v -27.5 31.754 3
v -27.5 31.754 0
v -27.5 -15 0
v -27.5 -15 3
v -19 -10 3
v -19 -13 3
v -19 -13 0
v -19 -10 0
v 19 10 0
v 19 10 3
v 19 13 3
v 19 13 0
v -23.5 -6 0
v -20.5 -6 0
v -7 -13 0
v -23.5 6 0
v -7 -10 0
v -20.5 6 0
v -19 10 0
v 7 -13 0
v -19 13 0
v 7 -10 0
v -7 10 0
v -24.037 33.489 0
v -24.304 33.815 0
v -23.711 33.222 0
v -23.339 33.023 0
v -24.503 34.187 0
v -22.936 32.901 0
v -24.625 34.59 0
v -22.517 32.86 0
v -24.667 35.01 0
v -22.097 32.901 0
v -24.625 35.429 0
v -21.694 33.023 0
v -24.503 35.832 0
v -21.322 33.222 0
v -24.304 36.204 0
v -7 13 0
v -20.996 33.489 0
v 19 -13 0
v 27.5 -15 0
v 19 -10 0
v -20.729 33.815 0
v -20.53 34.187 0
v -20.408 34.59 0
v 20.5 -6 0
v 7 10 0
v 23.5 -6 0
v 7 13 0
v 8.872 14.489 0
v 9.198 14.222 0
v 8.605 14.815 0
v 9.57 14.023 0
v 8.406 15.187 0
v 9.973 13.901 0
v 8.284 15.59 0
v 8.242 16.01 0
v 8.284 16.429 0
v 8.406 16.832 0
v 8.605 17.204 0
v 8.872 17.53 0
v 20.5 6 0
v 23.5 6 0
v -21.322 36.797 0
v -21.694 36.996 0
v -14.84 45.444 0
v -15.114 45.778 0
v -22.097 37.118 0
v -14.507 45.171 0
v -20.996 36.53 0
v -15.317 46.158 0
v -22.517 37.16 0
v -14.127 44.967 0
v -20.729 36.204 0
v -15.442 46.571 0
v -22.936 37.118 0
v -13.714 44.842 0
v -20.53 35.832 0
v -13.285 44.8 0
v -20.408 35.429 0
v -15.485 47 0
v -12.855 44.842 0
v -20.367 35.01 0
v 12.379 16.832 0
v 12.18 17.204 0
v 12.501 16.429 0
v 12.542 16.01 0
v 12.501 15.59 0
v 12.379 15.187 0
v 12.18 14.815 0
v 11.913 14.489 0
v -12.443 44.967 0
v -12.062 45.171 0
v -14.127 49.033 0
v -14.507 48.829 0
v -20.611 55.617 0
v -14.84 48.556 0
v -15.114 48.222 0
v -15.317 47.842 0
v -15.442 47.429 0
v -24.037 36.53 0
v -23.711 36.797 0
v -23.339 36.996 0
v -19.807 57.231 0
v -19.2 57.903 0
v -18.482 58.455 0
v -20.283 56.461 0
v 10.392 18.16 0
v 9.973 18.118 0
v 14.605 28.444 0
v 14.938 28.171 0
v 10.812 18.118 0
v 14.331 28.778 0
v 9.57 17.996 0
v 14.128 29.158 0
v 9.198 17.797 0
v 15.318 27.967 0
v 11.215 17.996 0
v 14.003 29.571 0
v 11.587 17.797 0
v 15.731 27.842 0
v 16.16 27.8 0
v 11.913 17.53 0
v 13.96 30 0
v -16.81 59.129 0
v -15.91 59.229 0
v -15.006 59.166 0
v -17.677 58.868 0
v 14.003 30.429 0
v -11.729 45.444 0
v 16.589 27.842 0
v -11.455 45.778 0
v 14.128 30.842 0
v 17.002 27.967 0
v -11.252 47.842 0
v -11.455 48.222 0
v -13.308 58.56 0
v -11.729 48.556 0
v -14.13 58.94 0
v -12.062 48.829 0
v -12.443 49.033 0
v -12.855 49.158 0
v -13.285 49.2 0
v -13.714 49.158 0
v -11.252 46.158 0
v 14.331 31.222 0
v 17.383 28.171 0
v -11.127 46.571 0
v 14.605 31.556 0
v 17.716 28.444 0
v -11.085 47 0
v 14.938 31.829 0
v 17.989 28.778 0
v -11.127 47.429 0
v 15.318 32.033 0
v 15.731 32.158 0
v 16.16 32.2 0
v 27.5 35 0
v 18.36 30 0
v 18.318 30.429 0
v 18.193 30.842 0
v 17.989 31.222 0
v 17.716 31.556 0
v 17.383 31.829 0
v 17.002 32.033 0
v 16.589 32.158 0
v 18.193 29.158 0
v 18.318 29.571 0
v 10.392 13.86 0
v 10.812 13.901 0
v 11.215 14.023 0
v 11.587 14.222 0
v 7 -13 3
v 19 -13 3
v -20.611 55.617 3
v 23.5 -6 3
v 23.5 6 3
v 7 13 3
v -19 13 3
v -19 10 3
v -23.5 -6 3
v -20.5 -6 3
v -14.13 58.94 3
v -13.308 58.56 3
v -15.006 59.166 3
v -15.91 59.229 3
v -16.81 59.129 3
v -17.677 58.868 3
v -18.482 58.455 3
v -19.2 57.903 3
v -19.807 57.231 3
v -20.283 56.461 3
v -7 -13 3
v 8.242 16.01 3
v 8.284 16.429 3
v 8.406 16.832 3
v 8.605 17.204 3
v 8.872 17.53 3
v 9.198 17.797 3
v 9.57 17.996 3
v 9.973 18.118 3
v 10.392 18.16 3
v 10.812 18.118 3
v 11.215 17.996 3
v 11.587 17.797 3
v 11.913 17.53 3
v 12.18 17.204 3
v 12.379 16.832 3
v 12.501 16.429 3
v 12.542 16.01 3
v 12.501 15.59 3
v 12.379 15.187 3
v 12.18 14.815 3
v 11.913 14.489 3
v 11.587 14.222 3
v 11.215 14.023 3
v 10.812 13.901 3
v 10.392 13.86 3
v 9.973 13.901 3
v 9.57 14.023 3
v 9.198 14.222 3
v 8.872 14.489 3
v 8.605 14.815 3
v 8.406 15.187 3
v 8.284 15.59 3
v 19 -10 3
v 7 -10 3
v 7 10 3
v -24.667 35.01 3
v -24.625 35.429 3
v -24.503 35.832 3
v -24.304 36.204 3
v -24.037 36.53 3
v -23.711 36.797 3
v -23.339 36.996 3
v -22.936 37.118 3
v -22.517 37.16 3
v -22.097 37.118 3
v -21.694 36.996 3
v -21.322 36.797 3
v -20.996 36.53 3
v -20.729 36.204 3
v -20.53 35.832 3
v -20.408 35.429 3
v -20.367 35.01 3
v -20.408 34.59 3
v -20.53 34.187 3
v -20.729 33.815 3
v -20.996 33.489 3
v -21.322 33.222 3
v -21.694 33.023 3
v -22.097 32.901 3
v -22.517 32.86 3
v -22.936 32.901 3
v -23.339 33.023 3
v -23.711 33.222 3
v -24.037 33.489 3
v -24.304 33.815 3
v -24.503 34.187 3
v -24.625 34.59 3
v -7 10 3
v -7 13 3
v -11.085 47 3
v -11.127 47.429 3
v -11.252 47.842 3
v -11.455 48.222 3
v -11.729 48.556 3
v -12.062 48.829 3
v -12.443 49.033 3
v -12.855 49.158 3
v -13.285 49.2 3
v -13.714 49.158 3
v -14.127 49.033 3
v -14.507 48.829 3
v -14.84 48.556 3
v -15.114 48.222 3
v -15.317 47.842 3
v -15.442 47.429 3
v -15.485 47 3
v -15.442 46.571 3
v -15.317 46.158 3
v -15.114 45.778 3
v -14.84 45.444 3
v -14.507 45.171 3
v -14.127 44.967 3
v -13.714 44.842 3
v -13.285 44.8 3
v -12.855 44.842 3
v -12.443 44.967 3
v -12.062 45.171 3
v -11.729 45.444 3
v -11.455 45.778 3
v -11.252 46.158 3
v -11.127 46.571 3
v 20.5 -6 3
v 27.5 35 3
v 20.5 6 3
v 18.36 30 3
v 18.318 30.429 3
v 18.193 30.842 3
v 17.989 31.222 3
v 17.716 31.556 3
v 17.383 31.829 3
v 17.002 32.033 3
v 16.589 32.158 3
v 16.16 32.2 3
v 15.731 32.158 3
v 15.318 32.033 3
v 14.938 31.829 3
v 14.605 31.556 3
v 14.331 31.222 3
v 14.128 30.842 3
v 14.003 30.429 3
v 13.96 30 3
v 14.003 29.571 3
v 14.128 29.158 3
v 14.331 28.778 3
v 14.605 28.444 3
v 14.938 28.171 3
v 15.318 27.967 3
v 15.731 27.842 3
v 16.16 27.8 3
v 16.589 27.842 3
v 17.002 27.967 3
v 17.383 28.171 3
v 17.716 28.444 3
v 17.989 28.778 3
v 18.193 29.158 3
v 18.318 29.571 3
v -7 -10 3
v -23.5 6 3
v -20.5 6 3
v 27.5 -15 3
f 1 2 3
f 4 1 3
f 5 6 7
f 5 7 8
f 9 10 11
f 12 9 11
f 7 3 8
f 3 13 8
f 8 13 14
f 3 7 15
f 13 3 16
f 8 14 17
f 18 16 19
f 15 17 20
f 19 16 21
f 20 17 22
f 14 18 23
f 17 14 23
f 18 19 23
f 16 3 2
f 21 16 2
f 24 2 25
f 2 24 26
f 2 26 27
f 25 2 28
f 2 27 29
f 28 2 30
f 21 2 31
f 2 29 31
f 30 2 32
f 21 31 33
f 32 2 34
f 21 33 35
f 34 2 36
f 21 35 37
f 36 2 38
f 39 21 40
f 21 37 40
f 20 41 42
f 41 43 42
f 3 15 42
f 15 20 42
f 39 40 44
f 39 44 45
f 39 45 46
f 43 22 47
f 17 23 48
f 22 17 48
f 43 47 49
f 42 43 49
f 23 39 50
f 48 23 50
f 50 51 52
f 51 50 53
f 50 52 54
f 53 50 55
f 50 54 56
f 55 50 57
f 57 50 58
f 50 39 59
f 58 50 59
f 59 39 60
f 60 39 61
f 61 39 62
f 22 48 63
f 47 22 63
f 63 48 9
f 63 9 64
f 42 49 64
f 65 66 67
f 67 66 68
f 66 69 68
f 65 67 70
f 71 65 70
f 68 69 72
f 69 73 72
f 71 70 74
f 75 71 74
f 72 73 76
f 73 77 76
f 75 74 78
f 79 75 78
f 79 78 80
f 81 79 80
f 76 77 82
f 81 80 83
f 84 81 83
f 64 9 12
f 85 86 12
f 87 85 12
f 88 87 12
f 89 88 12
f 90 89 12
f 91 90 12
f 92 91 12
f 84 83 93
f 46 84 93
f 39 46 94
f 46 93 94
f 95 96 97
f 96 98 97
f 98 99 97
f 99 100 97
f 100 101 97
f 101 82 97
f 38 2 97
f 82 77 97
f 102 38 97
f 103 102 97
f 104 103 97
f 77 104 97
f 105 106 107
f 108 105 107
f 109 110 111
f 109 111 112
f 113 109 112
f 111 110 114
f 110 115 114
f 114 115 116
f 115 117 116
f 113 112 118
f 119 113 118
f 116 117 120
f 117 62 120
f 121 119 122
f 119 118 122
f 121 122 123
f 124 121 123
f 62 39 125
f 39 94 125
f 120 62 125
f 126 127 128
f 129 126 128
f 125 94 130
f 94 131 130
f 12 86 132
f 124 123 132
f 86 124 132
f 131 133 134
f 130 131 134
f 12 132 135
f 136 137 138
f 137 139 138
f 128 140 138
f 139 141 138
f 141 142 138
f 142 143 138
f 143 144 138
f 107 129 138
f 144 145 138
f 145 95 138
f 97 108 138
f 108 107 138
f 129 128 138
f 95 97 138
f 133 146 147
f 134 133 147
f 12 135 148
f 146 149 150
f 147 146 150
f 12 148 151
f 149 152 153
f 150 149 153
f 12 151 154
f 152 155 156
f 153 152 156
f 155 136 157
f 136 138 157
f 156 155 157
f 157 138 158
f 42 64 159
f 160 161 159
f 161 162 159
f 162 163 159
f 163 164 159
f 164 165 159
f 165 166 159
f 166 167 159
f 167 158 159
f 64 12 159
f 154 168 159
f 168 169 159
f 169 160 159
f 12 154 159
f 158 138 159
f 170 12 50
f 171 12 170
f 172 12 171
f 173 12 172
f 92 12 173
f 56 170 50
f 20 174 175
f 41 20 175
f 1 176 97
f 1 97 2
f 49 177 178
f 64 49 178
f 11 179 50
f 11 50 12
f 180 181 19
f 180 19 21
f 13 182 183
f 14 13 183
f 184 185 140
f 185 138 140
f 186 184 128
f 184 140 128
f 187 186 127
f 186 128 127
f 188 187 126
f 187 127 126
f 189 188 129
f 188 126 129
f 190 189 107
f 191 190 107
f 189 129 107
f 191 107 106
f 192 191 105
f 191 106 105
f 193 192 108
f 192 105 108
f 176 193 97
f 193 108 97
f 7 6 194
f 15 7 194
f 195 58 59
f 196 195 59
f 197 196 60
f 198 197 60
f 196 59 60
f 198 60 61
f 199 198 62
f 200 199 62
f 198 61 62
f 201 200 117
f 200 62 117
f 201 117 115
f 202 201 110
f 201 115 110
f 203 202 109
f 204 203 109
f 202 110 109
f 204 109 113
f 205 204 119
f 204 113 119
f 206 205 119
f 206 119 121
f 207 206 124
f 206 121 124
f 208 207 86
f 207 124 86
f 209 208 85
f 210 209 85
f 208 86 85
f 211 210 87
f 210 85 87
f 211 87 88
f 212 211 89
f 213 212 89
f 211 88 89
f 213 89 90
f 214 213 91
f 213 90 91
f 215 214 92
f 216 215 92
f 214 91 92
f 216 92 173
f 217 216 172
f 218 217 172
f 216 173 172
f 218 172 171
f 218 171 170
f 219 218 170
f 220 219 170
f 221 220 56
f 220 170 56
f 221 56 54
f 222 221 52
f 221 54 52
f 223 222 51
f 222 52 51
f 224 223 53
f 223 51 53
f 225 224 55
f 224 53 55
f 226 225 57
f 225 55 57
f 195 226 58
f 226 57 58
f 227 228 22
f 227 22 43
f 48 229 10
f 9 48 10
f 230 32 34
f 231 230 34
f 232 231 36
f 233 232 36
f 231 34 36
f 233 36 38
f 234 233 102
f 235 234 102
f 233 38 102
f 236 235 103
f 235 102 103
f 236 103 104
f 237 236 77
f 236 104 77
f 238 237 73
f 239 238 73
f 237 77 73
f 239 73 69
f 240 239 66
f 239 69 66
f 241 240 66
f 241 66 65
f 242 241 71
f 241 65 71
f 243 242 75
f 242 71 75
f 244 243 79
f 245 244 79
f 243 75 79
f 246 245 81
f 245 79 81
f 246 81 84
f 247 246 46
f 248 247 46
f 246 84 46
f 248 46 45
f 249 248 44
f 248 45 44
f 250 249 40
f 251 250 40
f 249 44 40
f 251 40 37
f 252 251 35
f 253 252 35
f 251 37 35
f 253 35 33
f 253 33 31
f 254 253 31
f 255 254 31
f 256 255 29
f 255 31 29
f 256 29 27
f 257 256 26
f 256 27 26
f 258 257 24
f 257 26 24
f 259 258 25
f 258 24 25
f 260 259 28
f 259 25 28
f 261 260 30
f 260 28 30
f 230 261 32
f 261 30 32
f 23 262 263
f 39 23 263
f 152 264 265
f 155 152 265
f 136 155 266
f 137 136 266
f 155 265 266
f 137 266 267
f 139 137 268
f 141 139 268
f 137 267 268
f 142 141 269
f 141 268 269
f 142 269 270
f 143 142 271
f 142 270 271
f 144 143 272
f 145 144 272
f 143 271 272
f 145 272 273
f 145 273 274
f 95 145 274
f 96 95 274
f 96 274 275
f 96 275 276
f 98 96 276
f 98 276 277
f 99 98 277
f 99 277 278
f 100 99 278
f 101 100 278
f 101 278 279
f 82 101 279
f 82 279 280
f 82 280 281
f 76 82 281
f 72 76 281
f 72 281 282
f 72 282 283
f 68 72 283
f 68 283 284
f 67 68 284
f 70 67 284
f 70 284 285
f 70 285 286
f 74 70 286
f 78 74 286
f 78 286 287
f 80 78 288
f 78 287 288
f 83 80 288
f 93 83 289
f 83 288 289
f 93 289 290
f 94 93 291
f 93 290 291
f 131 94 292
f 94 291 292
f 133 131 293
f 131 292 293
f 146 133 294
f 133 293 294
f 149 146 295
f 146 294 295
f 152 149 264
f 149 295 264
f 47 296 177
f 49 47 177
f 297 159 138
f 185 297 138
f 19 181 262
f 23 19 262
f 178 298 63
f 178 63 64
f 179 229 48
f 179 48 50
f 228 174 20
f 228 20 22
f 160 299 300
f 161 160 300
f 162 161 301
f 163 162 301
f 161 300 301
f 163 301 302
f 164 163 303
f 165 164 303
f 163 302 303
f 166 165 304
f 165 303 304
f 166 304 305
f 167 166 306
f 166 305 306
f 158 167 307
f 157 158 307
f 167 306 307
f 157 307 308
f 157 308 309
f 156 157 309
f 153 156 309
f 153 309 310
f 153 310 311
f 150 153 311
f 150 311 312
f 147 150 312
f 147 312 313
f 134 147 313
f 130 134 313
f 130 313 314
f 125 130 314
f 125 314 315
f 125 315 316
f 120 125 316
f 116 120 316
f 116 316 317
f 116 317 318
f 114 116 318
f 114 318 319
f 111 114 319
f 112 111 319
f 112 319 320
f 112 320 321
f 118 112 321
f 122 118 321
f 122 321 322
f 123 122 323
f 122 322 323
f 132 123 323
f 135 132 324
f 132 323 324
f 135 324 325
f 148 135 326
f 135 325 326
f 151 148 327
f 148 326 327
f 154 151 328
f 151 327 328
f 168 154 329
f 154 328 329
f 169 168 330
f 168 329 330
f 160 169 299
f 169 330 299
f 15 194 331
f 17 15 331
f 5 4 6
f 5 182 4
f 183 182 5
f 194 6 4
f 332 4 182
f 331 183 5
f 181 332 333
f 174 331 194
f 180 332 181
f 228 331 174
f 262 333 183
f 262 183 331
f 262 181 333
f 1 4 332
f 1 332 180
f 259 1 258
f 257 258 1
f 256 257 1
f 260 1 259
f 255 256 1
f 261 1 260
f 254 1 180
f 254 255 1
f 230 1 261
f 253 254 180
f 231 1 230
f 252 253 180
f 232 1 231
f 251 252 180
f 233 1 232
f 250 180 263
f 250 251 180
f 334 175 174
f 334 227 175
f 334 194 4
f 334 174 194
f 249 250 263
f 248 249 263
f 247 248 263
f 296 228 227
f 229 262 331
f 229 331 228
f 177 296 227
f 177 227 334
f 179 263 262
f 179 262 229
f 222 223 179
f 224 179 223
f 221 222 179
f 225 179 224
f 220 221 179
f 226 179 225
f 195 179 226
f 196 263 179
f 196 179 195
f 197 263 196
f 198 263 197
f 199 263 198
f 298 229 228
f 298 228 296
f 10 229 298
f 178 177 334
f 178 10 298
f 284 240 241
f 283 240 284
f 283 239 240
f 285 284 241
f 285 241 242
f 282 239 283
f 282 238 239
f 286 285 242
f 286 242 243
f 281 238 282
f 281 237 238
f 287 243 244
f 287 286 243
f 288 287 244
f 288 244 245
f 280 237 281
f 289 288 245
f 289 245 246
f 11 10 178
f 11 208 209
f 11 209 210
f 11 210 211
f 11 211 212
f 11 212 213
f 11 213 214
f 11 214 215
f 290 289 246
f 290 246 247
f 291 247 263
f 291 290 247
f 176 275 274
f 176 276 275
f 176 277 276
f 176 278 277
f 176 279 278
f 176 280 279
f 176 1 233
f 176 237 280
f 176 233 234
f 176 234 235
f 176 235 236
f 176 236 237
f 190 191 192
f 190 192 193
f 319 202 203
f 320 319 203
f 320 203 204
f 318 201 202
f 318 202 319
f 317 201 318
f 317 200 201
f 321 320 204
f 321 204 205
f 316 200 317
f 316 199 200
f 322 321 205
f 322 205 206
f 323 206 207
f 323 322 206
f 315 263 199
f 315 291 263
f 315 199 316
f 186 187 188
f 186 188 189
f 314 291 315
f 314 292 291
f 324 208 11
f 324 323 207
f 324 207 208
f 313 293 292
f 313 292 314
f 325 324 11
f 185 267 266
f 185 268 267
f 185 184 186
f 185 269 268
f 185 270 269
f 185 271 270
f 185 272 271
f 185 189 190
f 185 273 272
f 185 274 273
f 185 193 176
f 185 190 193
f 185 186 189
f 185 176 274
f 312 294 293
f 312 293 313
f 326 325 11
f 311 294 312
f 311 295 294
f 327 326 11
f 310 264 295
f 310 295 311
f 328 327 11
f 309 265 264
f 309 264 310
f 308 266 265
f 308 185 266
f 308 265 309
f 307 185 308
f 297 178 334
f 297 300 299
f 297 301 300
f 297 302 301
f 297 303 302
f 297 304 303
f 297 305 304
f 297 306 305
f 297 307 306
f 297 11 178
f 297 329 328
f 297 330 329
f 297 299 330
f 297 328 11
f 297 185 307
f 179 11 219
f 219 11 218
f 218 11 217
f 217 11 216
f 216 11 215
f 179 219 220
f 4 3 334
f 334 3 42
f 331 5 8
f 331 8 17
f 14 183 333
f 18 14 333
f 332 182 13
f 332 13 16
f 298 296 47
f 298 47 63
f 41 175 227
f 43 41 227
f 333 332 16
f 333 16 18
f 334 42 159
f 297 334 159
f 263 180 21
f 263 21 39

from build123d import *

# Parameters (mm, degrees)
SKETCH_1_W          = 55
SKETCH_1_H          = 30
EXTRUDE_1_DEPTH     = 3
SKETCH_2_W          = 12
SKETCH_2_H          = 3
SKETCH_2_W_2        = 3
SKETCH_2_H_2        = 12
CUT_EXTRUDE_1_DEPTH = 3
SKETCH_3_R          = 2.2
CUT_EXTRUDE_2_DEPTH = 10
CUT_EXTRUDE_3_DEPTH = 10
FILLET_1_R          = 5
SKETCH_5_R          = 2.15
CUT_EXTRUDE_4_DEPTH = 3


with BuildPart() as part:
    # 草图1 → 凸台-拉伸1 (new body)
    with BuildSketch(Plane.XY):
        Polygon((27.5, 35), (-27.5, 66.754264805), (-27.5, 15), (27.5, 15), align=None)
        Rectangle(SKETCH_1_W, SKETCH_1_H)
    extrude(amount=EXTRUDE_1_DEPTH)

    # 草图2 → 切除-拉伸1 (cut)
    with BuildSketch(Plane.XY.offset(3)):
        with Locations((-13, -11.5)):
            Rectangle(SKETCH_2_W, SKETCH_2_H)
        with Locations((13, -11.5)):
            Rectangle(SKETCH_2_W, SKETCH_2_H)
        with Locations((13, 11.5)):
            Rectangle(SKETCH_2_W, SKETCH_2_H)
        with Locations((-13, 11.5)):
            Rectangle(SKETCH_2_W, SKETCH_2_H)
        with Locations((22, 0)):
            Rectangle(SKETCH_2_W_2, SKETCH_2_H_2)
        with Locations((-22, 0)):
            Rectangle(SKETCH_2_W_2, SKETCH_2_H_2)
    extrude(amount=-CUT_EXTRUDE_1_DEPTH, mode=Mode.SUBTRACT)

    # 草图3 → 切除-拉伸2 (cut)
    with BuildSketch(Plane.XY.offset(3)):
        with Locations((-13.284609691, 47)):
            Circle(SKETCH_3_R)
        with Locations((16.160254038, 30)):
            Circle(SKETCH_3_R)
    extrude(amount=-CUT_EXTRUDE_2_DEPTH, mode=Mode.SUBTRACT)

    # 草图4 → 切除-拉伸3 (cut)
    with BuildSketch(Plane.XY.offset(3)):
        Polygon((-18.839745962, 61.754264805), (-27.5, 31.754264805), (-27.5, 66.754264805), align=None)
    extrude(amount=-CUT_EXTRUDE_3_DEPTH, mode=Mode.SUBTRACT)

    # 圆角1
    fillet_1_edges = [part.edges().sort_by_distance(p)[0] for p in [
        (-18.839745962, 61.754264805, 1.5),
    ]]
    fillet(fillet_1_edges, radius=FILLET_1_R)

    # 草图5 → 切除-拉伸4 (cut)
    with BuildSketch(Plane(origin=(0, 0, 0), x_dir=(-1, 0, 0), z_dir=(0, 0, -1))):
        with Locations((-10.392304845, 16.009618943)):
            Circle(SKETCH_5_R)
        with Locations((22.516660498, 35.009618943)):
            Circle(SKETCH_5_R)
    extrude(amount=-CUT_EXTRUDE_4_DEPTH, mode=Mode.SUBTRACT)


solid = part.part
